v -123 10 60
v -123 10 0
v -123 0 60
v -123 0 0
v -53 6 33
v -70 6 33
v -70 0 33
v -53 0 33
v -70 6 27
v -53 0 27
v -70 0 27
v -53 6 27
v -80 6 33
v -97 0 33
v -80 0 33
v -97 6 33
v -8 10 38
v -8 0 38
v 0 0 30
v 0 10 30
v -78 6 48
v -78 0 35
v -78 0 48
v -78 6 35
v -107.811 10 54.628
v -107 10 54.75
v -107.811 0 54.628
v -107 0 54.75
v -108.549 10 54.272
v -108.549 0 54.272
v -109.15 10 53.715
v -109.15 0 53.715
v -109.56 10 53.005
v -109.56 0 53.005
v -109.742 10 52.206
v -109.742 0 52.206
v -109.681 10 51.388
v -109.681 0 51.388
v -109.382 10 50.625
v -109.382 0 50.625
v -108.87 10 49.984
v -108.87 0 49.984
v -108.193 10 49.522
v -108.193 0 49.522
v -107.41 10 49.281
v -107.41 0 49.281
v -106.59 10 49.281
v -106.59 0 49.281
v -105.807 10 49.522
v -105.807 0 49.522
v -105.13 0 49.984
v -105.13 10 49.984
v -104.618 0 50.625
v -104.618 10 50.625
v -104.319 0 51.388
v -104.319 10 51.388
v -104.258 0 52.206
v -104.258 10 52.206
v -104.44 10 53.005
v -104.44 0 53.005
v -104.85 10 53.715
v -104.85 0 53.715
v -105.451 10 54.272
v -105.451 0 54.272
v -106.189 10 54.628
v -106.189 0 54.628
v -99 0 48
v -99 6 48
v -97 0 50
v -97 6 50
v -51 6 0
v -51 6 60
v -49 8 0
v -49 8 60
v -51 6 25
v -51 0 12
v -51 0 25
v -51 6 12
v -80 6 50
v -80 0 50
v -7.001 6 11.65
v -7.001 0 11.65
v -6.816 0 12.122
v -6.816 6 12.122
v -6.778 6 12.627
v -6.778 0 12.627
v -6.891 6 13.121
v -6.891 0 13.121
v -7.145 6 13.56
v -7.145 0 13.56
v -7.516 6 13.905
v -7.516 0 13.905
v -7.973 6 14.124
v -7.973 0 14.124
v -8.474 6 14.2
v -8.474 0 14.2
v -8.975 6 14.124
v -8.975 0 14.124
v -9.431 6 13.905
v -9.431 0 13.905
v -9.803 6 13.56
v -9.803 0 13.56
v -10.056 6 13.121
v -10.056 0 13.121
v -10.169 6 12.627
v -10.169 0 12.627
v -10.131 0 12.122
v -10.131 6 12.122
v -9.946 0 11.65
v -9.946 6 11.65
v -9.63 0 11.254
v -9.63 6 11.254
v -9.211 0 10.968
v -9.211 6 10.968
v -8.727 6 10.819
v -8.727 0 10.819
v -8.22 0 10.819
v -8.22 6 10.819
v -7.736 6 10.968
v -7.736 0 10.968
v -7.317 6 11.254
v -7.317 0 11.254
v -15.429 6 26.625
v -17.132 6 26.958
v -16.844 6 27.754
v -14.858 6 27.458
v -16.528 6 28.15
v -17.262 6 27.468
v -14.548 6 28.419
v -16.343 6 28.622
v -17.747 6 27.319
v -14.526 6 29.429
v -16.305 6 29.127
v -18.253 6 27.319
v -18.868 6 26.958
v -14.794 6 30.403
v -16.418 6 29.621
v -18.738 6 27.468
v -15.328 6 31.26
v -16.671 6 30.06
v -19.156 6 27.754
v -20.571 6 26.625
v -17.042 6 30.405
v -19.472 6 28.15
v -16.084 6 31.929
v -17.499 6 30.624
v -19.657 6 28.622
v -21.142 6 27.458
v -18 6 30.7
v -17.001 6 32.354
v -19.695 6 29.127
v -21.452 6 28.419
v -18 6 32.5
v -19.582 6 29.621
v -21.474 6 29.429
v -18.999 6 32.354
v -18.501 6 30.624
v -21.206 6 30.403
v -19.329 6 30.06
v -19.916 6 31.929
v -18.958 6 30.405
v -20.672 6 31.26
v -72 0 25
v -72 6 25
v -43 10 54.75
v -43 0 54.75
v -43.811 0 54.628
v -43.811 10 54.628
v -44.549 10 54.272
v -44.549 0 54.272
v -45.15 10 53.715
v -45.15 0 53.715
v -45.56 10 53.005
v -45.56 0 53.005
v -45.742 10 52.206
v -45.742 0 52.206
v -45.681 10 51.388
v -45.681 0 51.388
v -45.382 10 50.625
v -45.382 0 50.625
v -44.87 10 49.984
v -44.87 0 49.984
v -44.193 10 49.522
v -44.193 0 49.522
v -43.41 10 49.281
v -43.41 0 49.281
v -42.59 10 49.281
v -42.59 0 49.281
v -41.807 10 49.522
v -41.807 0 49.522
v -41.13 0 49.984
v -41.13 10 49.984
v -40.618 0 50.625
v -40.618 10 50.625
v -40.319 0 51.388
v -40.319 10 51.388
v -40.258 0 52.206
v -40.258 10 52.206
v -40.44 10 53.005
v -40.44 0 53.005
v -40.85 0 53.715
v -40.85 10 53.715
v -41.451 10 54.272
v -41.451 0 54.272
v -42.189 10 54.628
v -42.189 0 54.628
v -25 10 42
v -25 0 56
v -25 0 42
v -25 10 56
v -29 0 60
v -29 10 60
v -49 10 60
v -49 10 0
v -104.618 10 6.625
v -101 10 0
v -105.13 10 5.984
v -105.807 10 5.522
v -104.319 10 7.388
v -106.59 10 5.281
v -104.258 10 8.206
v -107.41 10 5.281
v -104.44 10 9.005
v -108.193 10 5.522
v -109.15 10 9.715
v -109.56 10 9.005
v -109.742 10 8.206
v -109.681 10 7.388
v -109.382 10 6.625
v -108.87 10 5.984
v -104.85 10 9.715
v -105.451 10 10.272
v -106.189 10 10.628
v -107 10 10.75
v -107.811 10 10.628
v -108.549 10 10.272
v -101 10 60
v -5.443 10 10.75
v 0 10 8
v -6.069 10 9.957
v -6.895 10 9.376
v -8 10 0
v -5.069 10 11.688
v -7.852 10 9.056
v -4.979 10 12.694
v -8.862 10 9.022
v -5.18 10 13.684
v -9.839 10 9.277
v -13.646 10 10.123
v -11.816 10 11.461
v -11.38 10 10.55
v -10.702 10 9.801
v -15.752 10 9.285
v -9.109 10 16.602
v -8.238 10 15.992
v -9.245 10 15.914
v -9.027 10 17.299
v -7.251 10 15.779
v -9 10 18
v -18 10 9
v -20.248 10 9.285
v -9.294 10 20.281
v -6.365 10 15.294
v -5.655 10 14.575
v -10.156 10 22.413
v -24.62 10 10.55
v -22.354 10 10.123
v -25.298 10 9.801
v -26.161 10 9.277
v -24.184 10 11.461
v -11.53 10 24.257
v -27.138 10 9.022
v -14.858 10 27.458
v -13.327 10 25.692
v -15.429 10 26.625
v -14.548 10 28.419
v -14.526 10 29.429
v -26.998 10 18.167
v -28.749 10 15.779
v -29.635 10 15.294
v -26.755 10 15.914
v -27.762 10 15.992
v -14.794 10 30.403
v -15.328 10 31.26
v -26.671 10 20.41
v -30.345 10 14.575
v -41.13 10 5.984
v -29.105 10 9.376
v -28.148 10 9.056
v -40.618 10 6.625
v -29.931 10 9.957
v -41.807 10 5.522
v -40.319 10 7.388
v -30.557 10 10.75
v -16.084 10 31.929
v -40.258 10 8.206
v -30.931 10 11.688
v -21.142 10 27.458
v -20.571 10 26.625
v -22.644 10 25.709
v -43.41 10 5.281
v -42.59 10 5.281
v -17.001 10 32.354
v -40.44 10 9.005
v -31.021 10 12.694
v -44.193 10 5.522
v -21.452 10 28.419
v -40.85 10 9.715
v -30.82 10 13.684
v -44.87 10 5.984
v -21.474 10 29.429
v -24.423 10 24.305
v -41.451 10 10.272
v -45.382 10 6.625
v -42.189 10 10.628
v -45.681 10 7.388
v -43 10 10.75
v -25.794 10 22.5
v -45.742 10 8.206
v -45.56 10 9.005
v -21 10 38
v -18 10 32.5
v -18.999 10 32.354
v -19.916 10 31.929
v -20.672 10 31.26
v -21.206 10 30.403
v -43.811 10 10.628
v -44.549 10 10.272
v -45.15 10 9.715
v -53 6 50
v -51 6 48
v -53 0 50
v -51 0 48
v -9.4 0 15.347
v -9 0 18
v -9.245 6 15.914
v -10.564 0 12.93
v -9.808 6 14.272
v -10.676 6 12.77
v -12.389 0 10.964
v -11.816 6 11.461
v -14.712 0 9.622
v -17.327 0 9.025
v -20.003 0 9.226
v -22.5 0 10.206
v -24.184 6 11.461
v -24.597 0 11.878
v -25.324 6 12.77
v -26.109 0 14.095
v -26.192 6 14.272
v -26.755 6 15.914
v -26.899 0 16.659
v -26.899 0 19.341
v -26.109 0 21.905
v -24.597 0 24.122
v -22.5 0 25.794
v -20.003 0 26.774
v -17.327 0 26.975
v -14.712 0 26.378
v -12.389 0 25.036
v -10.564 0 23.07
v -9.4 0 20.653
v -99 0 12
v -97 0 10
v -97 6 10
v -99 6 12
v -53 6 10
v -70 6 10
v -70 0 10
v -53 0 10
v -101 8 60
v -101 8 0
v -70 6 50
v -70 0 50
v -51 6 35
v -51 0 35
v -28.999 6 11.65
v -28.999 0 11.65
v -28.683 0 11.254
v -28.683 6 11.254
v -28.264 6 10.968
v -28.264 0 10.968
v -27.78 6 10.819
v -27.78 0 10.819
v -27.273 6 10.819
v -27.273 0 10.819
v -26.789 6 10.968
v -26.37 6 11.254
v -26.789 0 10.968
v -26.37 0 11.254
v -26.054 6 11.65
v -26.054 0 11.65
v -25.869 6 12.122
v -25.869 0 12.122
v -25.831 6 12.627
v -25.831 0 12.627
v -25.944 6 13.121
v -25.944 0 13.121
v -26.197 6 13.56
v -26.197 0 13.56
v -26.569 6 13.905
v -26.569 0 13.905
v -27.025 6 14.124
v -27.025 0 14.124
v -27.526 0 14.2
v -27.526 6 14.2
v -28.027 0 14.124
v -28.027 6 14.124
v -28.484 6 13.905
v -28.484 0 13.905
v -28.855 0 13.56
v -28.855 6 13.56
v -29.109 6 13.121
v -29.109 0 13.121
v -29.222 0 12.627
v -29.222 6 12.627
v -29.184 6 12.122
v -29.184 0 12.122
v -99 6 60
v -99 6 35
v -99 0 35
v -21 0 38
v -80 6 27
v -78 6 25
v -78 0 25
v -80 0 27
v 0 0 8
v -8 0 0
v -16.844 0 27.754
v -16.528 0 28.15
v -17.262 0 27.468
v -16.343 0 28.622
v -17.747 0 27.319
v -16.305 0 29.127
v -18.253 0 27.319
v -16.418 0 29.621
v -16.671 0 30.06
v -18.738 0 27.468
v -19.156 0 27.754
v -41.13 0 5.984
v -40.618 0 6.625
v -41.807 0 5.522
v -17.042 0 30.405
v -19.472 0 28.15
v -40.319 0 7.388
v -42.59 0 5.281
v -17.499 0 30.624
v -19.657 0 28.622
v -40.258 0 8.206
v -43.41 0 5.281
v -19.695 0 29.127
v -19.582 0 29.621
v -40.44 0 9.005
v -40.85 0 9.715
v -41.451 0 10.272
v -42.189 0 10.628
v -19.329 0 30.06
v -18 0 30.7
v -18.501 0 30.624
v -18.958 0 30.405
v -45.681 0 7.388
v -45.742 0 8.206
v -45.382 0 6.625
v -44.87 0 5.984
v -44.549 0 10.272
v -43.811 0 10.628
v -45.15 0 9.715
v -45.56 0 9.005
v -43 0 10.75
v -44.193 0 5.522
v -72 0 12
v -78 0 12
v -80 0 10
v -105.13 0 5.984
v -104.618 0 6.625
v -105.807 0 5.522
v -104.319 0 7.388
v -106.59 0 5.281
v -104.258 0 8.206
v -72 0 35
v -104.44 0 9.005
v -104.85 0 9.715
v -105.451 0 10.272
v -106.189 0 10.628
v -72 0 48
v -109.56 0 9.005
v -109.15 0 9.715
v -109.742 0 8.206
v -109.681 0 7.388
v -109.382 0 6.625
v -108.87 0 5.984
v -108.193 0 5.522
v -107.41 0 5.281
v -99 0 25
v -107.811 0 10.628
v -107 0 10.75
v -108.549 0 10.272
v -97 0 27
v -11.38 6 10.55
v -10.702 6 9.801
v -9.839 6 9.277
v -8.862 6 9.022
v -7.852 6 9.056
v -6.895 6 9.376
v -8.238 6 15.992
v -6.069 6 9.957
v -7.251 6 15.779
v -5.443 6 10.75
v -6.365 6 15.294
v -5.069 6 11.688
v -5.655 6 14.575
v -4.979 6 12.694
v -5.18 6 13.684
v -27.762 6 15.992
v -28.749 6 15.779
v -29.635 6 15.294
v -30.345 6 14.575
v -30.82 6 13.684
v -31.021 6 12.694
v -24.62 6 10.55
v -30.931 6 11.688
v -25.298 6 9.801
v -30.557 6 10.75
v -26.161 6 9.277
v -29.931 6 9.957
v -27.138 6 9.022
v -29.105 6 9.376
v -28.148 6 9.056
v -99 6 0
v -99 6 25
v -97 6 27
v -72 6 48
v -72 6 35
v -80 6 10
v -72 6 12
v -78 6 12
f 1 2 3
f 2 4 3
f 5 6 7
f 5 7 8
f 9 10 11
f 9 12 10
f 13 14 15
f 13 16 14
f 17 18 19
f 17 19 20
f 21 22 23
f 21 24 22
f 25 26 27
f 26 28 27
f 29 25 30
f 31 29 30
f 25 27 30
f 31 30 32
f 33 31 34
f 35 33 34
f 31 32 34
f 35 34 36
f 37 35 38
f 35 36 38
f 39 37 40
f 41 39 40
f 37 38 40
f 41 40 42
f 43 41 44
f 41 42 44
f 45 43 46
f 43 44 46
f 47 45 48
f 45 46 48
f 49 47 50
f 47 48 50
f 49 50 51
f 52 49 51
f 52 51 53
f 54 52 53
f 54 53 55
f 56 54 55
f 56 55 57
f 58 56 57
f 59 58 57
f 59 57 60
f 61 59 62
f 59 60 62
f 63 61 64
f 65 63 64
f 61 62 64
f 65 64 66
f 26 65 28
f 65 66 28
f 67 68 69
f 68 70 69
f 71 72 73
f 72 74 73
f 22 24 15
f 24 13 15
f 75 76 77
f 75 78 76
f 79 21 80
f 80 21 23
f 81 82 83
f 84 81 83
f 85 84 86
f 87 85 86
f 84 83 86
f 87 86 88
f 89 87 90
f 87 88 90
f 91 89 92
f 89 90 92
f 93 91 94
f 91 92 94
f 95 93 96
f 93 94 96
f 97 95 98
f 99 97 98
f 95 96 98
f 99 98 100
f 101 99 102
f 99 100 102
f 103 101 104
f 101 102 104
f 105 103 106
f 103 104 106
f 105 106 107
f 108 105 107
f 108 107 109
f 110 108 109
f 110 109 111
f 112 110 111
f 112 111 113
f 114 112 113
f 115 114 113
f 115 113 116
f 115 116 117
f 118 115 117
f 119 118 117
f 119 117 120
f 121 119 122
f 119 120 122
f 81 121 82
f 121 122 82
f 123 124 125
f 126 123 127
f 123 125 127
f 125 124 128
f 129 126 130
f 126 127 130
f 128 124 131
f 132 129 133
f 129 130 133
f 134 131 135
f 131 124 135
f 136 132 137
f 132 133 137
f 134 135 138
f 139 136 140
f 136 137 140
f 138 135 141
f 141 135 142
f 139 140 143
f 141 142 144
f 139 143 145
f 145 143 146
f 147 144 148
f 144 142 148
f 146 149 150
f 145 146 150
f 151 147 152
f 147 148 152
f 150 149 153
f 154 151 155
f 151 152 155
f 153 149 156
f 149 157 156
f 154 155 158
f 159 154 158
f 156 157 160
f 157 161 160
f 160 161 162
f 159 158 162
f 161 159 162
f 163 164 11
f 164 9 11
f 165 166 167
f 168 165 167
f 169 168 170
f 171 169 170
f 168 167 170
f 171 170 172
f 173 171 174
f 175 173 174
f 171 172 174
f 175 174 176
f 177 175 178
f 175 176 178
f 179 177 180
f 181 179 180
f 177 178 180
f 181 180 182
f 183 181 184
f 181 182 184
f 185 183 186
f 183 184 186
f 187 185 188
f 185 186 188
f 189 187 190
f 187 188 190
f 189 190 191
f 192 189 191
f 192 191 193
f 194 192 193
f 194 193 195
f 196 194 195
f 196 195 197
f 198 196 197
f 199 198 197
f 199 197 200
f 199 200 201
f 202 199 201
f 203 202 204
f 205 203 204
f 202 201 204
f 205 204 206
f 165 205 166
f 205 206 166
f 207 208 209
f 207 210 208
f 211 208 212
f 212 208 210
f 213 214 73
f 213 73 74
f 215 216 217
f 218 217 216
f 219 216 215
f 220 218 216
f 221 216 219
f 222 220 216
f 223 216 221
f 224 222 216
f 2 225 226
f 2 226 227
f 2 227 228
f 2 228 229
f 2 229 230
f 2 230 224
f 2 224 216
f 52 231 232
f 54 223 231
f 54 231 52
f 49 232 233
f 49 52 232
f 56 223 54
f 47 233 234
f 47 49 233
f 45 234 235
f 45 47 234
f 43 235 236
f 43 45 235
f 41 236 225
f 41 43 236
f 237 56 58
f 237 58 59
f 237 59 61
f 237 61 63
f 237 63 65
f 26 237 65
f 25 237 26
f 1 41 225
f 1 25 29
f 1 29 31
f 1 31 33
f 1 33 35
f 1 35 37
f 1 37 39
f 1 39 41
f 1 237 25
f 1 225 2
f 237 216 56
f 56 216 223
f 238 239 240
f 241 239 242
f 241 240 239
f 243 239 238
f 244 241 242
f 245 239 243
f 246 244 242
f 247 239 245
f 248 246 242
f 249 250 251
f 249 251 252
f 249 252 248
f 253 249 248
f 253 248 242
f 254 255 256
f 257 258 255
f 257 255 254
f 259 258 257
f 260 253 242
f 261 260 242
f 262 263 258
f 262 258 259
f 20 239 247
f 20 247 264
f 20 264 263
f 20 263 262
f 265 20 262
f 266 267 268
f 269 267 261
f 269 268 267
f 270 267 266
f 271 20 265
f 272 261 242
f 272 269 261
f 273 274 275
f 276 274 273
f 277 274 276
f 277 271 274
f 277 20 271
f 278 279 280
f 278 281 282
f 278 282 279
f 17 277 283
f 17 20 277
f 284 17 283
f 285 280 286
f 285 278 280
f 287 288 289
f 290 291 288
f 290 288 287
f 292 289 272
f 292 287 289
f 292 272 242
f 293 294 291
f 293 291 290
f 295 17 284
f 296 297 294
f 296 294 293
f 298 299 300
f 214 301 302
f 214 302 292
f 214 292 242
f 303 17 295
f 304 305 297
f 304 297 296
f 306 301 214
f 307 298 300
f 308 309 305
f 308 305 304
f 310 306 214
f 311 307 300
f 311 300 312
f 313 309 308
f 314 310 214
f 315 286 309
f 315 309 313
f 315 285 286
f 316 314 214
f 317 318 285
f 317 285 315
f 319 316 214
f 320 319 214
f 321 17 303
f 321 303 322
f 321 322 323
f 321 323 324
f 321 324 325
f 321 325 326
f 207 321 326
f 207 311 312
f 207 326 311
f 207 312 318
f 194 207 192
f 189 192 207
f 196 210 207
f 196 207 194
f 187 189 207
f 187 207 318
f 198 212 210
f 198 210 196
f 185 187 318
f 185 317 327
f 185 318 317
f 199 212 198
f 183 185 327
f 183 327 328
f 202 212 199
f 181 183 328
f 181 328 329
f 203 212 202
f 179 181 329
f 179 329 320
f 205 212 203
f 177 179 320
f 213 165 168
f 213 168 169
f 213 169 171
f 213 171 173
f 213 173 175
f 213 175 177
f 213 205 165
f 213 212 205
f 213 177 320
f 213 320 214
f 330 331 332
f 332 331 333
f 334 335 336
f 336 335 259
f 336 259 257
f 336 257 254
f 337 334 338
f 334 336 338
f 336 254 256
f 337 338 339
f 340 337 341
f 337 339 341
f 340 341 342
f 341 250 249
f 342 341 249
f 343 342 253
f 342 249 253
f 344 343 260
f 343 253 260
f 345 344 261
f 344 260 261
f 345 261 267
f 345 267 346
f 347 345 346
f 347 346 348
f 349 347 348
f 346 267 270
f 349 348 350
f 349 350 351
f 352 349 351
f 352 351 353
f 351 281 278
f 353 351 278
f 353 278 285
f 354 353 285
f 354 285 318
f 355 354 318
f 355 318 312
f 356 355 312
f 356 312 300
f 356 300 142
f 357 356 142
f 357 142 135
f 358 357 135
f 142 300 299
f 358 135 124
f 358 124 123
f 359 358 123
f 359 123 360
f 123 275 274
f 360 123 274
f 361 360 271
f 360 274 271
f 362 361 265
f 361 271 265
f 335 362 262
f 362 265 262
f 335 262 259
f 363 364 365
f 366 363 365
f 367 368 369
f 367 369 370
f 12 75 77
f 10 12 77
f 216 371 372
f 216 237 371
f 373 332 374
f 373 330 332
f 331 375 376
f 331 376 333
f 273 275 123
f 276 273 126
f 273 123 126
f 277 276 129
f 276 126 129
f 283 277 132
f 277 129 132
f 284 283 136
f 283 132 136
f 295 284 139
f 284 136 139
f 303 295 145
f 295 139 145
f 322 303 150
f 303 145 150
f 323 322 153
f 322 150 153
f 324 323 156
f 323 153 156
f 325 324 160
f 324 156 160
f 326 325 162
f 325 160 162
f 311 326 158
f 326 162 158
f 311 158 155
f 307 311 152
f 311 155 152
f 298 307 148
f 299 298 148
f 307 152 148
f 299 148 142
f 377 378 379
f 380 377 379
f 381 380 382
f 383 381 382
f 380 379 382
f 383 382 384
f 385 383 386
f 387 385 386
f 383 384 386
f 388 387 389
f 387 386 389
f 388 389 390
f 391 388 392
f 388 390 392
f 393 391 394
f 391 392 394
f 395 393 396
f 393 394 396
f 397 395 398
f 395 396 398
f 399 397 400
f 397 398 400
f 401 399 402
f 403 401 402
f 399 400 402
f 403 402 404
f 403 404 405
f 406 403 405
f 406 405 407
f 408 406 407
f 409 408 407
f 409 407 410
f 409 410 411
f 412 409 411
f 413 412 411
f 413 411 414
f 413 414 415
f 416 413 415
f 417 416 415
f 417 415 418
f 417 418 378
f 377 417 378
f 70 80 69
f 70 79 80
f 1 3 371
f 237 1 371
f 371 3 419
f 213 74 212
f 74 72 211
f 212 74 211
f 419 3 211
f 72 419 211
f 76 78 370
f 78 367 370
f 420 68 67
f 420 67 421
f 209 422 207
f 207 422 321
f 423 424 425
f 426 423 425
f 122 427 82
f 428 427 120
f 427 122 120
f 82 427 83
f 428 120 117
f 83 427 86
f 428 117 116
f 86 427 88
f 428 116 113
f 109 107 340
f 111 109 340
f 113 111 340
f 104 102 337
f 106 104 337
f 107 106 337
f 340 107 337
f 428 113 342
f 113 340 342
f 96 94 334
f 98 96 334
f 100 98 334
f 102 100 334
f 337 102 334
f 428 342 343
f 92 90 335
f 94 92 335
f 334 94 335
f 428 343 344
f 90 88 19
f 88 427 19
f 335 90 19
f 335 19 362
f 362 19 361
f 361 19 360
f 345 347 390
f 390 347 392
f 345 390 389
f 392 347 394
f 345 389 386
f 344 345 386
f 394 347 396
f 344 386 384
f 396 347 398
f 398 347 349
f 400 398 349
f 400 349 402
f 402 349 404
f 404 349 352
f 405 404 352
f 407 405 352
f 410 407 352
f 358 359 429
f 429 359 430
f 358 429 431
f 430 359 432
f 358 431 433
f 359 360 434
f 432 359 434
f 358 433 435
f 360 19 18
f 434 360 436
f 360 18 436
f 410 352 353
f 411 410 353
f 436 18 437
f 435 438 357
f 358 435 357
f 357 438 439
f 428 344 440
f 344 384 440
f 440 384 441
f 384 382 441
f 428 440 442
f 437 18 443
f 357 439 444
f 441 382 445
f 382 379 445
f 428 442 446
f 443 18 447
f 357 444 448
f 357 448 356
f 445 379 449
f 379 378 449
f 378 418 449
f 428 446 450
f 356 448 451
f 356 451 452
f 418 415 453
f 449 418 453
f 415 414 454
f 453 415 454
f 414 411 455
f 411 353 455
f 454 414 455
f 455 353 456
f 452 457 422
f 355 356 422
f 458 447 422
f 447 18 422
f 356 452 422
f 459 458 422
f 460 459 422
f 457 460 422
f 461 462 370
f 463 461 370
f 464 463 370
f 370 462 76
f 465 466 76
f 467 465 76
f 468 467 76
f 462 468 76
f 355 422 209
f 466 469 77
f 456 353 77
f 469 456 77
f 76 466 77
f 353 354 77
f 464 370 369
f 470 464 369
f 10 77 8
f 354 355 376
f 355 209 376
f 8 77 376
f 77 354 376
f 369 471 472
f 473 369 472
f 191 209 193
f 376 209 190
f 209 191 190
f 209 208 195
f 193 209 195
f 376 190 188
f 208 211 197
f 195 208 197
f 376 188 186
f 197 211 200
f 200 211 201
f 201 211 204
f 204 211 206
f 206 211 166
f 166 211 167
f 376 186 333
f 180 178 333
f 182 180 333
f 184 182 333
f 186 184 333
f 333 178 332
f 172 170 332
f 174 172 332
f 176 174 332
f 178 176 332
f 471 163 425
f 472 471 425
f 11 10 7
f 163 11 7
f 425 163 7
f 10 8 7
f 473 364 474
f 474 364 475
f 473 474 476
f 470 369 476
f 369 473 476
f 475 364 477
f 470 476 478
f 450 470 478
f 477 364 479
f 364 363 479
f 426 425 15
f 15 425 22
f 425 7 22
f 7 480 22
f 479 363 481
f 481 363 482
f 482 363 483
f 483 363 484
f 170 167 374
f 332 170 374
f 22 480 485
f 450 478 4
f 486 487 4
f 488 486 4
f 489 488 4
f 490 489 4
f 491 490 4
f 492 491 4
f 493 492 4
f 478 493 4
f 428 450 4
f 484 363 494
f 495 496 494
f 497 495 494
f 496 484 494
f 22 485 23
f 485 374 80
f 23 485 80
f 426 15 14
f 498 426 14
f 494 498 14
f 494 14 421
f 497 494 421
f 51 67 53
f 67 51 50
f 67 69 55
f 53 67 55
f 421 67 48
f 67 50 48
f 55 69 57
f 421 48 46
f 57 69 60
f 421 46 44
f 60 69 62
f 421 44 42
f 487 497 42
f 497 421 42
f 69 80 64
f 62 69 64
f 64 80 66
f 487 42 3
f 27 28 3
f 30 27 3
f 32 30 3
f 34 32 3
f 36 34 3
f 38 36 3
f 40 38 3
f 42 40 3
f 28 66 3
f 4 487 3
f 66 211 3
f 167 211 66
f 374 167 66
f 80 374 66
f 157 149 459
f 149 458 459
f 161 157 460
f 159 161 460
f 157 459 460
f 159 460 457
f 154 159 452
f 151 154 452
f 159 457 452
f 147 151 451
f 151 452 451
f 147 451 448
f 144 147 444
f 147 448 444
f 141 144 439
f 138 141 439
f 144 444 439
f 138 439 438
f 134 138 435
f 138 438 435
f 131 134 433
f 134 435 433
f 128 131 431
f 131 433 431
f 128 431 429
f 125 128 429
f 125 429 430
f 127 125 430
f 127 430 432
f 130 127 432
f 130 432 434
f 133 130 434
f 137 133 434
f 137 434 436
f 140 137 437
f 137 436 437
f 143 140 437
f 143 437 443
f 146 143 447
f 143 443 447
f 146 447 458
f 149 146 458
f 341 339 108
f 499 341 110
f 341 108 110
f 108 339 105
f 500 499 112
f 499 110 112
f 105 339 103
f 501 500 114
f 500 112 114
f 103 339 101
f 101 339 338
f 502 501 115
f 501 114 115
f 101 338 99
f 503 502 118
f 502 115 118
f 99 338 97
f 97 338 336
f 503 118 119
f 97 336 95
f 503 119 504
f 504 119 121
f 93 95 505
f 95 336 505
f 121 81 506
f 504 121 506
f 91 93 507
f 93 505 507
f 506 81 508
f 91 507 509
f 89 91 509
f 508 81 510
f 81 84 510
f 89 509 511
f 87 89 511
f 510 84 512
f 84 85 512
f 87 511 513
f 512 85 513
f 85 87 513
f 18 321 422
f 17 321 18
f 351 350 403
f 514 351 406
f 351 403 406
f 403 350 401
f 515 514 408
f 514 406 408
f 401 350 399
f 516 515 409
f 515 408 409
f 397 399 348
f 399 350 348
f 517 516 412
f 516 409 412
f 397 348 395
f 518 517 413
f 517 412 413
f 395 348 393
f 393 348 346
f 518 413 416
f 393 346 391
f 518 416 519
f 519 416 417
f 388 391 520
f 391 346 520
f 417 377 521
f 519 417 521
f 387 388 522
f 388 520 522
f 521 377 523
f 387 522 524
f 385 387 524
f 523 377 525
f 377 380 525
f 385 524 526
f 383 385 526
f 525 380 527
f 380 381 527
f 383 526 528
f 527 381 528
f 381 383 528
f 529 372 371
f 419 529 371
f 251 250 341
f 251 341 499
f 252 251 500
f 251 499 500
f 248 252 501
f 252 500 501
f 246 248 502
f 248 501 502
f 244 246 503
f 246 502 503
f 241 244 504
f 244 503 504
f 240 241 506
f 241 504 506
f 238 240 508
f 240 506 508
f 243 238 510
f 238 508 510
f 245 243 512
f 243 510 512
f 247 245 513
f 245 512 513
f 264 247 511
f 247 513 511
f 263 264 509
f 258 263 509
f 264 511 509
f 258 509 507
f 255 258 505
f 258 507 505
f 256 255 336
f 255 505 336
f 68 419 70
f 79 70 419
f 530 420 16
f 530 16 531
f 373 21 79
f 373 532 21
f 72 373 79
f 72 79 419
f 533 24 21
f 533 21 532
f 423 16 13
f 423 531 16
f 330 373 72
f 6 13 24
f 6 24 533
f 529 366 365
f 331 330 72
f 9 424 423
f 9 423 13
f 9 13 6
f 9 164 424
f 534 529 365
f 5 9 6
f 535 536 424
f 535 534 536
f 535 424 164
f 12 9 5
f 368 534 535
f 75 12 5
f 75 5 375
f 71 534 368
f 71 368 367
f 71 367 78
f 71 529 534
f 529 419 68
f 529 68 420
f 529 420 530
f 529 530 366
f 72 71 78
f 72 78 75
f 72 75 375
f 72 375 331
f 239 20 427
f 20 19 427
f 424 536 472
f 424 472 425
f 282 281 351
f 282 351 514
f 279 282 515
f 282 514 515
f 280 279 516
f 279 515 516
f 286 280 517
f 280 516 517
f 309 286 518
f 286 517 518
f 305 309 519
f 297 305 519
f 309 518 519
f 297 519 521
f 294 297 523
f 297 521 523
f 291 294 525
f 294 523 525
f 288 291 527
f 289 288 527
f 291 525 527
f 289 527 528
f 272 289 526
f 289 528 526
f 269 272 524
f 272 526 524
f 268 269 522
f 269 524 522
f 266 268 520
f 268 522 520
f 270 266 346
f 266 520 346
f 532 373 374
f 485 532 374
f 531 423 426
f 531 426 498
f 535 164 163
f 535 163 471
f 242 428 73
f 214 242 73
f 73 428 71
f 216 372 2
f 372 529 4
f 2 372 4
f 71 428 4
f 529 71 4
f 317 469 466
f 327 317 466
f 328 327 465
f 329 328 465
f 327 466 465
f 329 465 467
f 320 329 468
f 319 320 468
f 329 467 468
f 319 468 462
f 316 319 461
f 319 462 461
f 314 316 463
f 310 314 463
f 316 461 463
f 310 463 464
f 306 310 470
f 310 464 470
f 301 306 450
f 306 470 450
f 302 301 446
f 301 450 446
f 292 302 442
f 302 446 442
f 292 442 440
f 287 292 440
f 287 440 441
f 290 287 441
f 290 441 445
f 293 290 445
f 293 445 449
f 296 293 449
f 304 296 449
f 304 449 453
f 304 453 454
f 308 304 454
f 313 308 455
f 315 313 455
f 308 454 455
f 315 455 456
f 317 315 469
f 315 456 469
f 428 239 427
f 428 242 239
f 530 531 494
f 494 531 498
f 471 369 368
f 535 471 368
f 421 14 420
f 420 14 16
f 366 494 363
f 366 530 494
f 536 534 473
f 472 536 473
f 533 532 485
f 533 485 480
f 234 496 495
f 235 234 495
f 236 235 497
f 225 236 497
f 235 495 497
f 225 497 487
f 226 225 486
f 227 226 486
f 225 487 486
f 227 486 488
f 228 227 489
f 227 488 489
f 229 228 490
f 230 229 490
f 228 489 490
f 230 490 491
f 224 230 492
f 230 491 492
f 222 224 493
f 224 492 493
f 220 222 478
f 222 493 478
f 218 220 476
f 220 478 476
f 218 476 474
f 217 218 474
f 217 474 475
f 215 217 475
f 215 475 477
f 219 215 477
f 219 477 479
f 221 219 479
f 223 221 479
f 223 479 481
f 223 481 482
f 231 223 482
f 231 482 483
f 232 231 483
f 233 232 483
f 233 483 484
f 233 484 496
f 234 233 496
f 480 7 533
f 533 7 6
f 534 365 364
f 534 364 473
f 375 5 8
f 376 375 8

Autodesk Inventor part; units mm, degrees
ref_plane "YZ Plane" through (0, 0, 0) normal (1, 0, 0) x (0, 1, 0)
ref_plane "XZ Plane" through (0, 0, 0) normal (0, 1, 0) x (-1, 0, 0)
ref_plane "XY Plane" through (0, 0, 0) normal (0, 0, 1) x (1, 0, 0)
sketch "Esquisse1" plane through (0, 0, 0) normal (0, 1, 0) x (-1, 0, 0)
  line L0 (0, 0) -> (123, 0)
  line L1 (123, 0) -> (123, 60)
  line L2 (123, 60) -> (0, 60)
  line L3 (0, 60) -> (0, 0)
  dimension "d1" = 123
  dimension "d2" = 60
extrude "Extrusion1" add sketch "Esquisse1" along normal blind 10
sketch "Esquisse2" plane through (0, 10, 0) normal (0, 1, 0) x (1, 0, 0)
  circle A0 centre (-18, -18) radius 9
  line L0 (0, 0) -> (-123, 0) projected
  line L1 (-123, 0) -> (-123, -60) projected
  line L2 (-123, -60) -> (0, -60) projected
  line L3 (0, -60) -> (0, 0) projected
  line L4 (-29, -9) -> (-7, -9) construction
  line L5 (-7, -9) -> (-7, -56) construction
  line L6 (-7, -56) -> (-29, -56) construction
  line L7 (-29, -56) -> (-29, -9) construction
  dimension "d5" = 18
  dimension "d7" = 18
  dimension "d9" = 18
  dimension "d27" = 22
  dimension "d28" = 11
  dimension "d29" = 9
  dimension "d30" = 47
  dimension "d31" = 7
  dimension "d44" = 9
extrude "Extrusion2" cut sketch "Esquisse2" against normal up to surface (10 mm away) contours A0
sketch "Esquisse4" plane through (0, 10, 0) normal (0, 1, 0) x (1, 0, 0)
  circle A0 centre (-18, -18) radius 9 projected
  line L0 (0, 0) -> (-123, 0) projected
  line L1 (-123, 0) -> (-123, -60) projected
  line L2 (-123, -60) -> (0, -60) projected
  line L3 (0, -60) -> (0, 0) projected
  point P0 (-18, -29)
  dimension "d16" = 11
hole "Perçage1" at (-18, 10, 29) direction (0, -1, 0) diameter 3.4 end through all counterbore diameter 7 counterbore depth 4 clearance for "Vis d'assemblage à tête hexagonale ISO 24017" size "M3" standard "ISO"
pattern_circular "Réseau circulaire1" count 3 over 360 about axis through (-18, 10, 18) along (0, -1, 0) of "Perçage1"
sketch "Esquisse5" plane through (0, 10, 0) normal (0, 1, 0) x (1, 0, 0)
  arc A0 (-9.2451, -15.9139) -> (-11.816, -11.4611) centre (-8.4737, -12.5) ccw projected
  arc A1 (-15.4291, -26.625) -> (-9.2451, -15.9139) centre (-18, -18) ccw projected
  arc A2 (-20.5709, -26.625) -> (-15.4291, -26.625) centre (-18, -29) ccw projected
  arc A3 (-26.7549, -15.9139) -> (-20.5709, -26.625) centre (-18, -18) ccw projected
  arc A4 (-24.184, -11.4611) -> (-26.7549, -15.9139) centre (-27.5263, -12.5) ccw projected
  arc A5 (-11.816, -11.4611) -> (-24.184, -11.4611) centre (-18, -18) ccw projected
  line L0 (0, 0) -> (-123, 0) projected
  line L1 (-123, 0) -> (-123, -60) projected
  line L2 (-123, -60) -> (0, -60) projected
  line L3 (0, -60) -> (0, 0) projected
  line L4 (-29, -18.7209) -> (-29, -39.8718) construction
  point P0 (-43, -8)
  point P1 (-43, -52)
  point P2 (-107, -8)
  point P3 (-107, -52)
  dimension "d32" = 11
  dimension "d33" = 14
  dimension "d34" = 8
  dimension "d35" = 8
  dimension "d36" = 16
hole "Perçage2" at (-43, 10, 8) at (-43, 10, 52) at (-107, 10, 8) at (-107, 10, 52) direction (0, -1, 0) diameter 5.5 end through all clearance for "Vis d'assemblage à tête hexagonale ISO 24017" size "M5" standard "ISO"
sketch "Esquisse6" plane through (0, 10, 0) normal (0, 1, 0) x (1, 0, 0)
  circle A0 centre (-107, -8) radius 2.75 projected
  circle A1 centre (-43, -8) radius 2.75 projected
  circle A2 centre (-43, -52) radius 2.75 projected
  circle A3 centre (-107, -52) radius 2.75 projected
  arc A4 (-9.2451, -15.9139) -> (-11.816, -11.4611) centre (-8.4737, -12.5) ccw projected
  arc A5 (-15.4291, -26.625) -> (-9.2451, -15.9139) centre (-18, -18) ccw projected
  arc A6 (-20.5709, -26.625) -> (-15.4291, -26.625) centre (-18, -29) ccw projected
  arc A7 (-26.7549, -15.9139) -> (-20.5709, -26.625) centre (-18, -18) ccw projected
  arc A8 (-24.184, -11.4611) -> (-26.7549, -15.9139) centre (-27.5263, -12.5) ccw projected
  arc A9 (-11.816, -11.4611) -> (-24.184, -11.4611) centre (-18, -18) ccw projected
  line L0 (0, 0) -> (-123, 0) projected
  line L1 (-123, 0) -> (-123, -60) projected
  line L2 (-123, -60) -> (0, -60) projected
  line L3 (0, -60) -> (0, 0) projected
  line L4 (-99, -10) -> (-78, -10)
  line L5 (-78, -10) -> (-78, -27)
  line L6 (-78, -27) -> (-99, -27)
  line L7 (-99, -27) -> (-99, -10)
  line L8 (-72, -10) -> (-51, -10)
  line L9 (-51, -10) -> (-51, -27)
  line L10 (-51, -27) -> (-72, -27)
  line L11 (-72, -27) -> (-72, -10)
  line L12 (-72, -33) -> (-51, -33)
  line L13 (-51, -33) -> (-51, -50)
  line L14 (-51, -50) -> (-72, -50)
  line L15 (-72, -50) -> (-72, -33)
  line L16 (-99, -33) -> (-78, -33)
  line L17 (-78, -33) -> (-78, -50)
  line L18 (-78, -50) -> (-99, -50)
  line L19 (-99, -50) -> (-99, -33)
  dimension "d47" = 10
  dimension "d48" = 10
  dimension "d49" = 8
  dimension "d50" = 6
  dimension "d51" = 6
  dimension "d52" = 8
extrude "Extrusion4" cut sketch "Esquisse6" against normal up to surface (10 mm away) contours L4 L5 L6 L7 | L8 L9 L10 L11 | L12 L13 L14 L15 | L16 L17 L18 L19
chamfer "Chanfrein1" distance 2 angle 45 16 edges at (-78, 5, 27) (-78, 5, 50) (-51, 5, 50) (-51, 5, 27) (-72, 5, 33) (-72, 5, 10) (-99, 5, 10) (-99, 5, 33) (-78, 5, 33) (-78, 5, 10) (-51, 5, 10) (-51, 5, 33) (-99, 5, 50) (-72, 5, 50) (-99, 5, 27) (-72, 5, 27)
sketch "Esquisse7" plane through (0, 10, 0) normal (0, 1, 0) x (1, 0, 0)
  line L0 (0, 0) -> (-123, 0) projected
  line L1 (-101, 0) -> (-49, 0)
  line L2 (-49, 0) -> (-49, -60)
  line L3 (-49, -60) -> (-101, -60)
  line L4 (-101, -60) -> (-101, 0)
  line L5 (-51, -35) -> (-51, -48) projected
  line L6 (-53, -50) -> (-51, -48) projected
  line L7 (-53, -50) -> (-70, -50) projected
  line L8 (-72, -48) -> (-70, -50) projected
  line L9 (-72, -48) -> (-72, -35) projected
  line L10 (-70, -33) -> (-72, -35) projected
  line L11 (-70, -33) -> (-53, -33) projected
  line L12 (-51, -35) -> (-53, -33) projected
  line L13 (-80, -50) -> (-97, -50) projected
  line L14 (-99, -48) -> (-97, -50) projected
  line L15 (-99, -48) -> (-99, -35) projected
  line L16 (-97, -33) -> (-99, -35) projected
  line L17 (-97, -33) -> (-80, -33) projected
  line L18 (-78, -35) -> (-80, -33) projected
  line L19 (-78, -35) -> (-78, -48) projected
  line L20 (-80, -50) -> (-78, -48) projected
  line L21 (-51, -12) -> (-51, -25) projected
  line L22 (-53, -27) -> (-51, -25) projected
  line L23 (-53, -27) -> (-70, -27) projected
  line L24 (-72, -25) -> (-70, -27) projected
  line L25 (-72, -25) -> (-72, -12) projected
  line L26 (-70, -10) -> (-72, -12) projected
  line L27 (-70, -10) -> (-53, -10) projected
  line L28 (-51, -12) -> (-53, -10) projected
  line L29 (-80, -27) -> (-97, -27) projected
  line L30 (-99, -25) -> (-97, -27) projected
  line L31 (-99, -25) -> (-99, -12) projected
  line L32 (-97, -10) -> (-99, -12) projected
  line L33 (-97, -10) -> (-80, -10) projected
  line L34 (-78, -12) -> (-80, -10) projected
  line L35 (-78, -12) -> (-78, -25) projected
  line L36 (-80, -27) -> (-78, -25) projected
  circle A0 centre (-107, -8) radius 2.75 projected
  circle A1 centre (-43, -8) radius 2.75 projected
  circle A2 centre (-43, -52) radius 2.75 projected
  circle A3 centre (-107, -52) radius 2.75 projected
  arc A4 (-9.2451, -15.9139) -> (-11.816, -11.4611) centre (-8.4737, -12.5) ccw projected
  arc A5 (-15.4291, -26.625) -> (-9.2451, -15.9139) centre (-18, -18) ccw projected
  arc A6 (-20.5709, -26.625) -> (-15.4291, -26.625) centre (-18, -29) ccw projected
  arc A7 (-26.7549, -15.9139) -> (-20.5709, -26.625) centre (-18, -18) ccw projected
  arc A8 (-24.184, -11.4611) -> (-26.7549, -15.9139) centre (-27.5263, -12.5) ccw projected
  arc A9 (-11.816, -11.4611) -> (-24.184, -11.4611) centre (-18, -18) ccw projected
  line L37 (0, -60) -> (0, 0) projected
  line L38 (0, 0) -> (-123, 0) projected
  line L39 (-123, 0) -> (-123, -60) projected
  line L40 (-123, -60) -> (0, -60) projected
  line L41 (-123, -60) -> (-25, -60) projected
  point P0 (-5, 0)
  dimension "d67" = 6
  dimension "d68" = 6
extrude "Extrusion5" cut sketch "Esquisse7" against normal blind 4 contours L2 L3 L4 L0
chamfer "Chanfrein5" distance 2 angle 45 2 edges at (-101, 6, 30) (-49, 6, 30)
sketch "Esquisse8" plane through (0, 10, 0) normal (0, 1, 0) x (1, 0, 0)
  line L0 (-123, -60) -> (0, -60) projected
  line L1 (0, -60) -> (-25, -60)
  line L2 (-25, -60) -> (-25, -38)
  line L3 (-25, -38) -> (0, -38)
  line L4 (0, -38) -> (0, -60)
  point P0 (0, 0)
  dimension "d74" = 25
  dimension "d75" = 22
extrude "Extrusion6" cut sketch "Esquisse8" against normal up to surface (10 mm away)
chamfer "Chanfrein6" distance 4 angle 45 2 edges at (-25, 5, 38) (-25, 5, 60)
chamfer "Chanfrein7" distance 8 angle 45 2 edges at (0, 5, 38) (0, 5, 0)
equation "\"d28\" = 0.5 * d27"
equation "\"d35\" = d34"
equation "\"d51\" = d50"
properties part number "attache_moteur"
